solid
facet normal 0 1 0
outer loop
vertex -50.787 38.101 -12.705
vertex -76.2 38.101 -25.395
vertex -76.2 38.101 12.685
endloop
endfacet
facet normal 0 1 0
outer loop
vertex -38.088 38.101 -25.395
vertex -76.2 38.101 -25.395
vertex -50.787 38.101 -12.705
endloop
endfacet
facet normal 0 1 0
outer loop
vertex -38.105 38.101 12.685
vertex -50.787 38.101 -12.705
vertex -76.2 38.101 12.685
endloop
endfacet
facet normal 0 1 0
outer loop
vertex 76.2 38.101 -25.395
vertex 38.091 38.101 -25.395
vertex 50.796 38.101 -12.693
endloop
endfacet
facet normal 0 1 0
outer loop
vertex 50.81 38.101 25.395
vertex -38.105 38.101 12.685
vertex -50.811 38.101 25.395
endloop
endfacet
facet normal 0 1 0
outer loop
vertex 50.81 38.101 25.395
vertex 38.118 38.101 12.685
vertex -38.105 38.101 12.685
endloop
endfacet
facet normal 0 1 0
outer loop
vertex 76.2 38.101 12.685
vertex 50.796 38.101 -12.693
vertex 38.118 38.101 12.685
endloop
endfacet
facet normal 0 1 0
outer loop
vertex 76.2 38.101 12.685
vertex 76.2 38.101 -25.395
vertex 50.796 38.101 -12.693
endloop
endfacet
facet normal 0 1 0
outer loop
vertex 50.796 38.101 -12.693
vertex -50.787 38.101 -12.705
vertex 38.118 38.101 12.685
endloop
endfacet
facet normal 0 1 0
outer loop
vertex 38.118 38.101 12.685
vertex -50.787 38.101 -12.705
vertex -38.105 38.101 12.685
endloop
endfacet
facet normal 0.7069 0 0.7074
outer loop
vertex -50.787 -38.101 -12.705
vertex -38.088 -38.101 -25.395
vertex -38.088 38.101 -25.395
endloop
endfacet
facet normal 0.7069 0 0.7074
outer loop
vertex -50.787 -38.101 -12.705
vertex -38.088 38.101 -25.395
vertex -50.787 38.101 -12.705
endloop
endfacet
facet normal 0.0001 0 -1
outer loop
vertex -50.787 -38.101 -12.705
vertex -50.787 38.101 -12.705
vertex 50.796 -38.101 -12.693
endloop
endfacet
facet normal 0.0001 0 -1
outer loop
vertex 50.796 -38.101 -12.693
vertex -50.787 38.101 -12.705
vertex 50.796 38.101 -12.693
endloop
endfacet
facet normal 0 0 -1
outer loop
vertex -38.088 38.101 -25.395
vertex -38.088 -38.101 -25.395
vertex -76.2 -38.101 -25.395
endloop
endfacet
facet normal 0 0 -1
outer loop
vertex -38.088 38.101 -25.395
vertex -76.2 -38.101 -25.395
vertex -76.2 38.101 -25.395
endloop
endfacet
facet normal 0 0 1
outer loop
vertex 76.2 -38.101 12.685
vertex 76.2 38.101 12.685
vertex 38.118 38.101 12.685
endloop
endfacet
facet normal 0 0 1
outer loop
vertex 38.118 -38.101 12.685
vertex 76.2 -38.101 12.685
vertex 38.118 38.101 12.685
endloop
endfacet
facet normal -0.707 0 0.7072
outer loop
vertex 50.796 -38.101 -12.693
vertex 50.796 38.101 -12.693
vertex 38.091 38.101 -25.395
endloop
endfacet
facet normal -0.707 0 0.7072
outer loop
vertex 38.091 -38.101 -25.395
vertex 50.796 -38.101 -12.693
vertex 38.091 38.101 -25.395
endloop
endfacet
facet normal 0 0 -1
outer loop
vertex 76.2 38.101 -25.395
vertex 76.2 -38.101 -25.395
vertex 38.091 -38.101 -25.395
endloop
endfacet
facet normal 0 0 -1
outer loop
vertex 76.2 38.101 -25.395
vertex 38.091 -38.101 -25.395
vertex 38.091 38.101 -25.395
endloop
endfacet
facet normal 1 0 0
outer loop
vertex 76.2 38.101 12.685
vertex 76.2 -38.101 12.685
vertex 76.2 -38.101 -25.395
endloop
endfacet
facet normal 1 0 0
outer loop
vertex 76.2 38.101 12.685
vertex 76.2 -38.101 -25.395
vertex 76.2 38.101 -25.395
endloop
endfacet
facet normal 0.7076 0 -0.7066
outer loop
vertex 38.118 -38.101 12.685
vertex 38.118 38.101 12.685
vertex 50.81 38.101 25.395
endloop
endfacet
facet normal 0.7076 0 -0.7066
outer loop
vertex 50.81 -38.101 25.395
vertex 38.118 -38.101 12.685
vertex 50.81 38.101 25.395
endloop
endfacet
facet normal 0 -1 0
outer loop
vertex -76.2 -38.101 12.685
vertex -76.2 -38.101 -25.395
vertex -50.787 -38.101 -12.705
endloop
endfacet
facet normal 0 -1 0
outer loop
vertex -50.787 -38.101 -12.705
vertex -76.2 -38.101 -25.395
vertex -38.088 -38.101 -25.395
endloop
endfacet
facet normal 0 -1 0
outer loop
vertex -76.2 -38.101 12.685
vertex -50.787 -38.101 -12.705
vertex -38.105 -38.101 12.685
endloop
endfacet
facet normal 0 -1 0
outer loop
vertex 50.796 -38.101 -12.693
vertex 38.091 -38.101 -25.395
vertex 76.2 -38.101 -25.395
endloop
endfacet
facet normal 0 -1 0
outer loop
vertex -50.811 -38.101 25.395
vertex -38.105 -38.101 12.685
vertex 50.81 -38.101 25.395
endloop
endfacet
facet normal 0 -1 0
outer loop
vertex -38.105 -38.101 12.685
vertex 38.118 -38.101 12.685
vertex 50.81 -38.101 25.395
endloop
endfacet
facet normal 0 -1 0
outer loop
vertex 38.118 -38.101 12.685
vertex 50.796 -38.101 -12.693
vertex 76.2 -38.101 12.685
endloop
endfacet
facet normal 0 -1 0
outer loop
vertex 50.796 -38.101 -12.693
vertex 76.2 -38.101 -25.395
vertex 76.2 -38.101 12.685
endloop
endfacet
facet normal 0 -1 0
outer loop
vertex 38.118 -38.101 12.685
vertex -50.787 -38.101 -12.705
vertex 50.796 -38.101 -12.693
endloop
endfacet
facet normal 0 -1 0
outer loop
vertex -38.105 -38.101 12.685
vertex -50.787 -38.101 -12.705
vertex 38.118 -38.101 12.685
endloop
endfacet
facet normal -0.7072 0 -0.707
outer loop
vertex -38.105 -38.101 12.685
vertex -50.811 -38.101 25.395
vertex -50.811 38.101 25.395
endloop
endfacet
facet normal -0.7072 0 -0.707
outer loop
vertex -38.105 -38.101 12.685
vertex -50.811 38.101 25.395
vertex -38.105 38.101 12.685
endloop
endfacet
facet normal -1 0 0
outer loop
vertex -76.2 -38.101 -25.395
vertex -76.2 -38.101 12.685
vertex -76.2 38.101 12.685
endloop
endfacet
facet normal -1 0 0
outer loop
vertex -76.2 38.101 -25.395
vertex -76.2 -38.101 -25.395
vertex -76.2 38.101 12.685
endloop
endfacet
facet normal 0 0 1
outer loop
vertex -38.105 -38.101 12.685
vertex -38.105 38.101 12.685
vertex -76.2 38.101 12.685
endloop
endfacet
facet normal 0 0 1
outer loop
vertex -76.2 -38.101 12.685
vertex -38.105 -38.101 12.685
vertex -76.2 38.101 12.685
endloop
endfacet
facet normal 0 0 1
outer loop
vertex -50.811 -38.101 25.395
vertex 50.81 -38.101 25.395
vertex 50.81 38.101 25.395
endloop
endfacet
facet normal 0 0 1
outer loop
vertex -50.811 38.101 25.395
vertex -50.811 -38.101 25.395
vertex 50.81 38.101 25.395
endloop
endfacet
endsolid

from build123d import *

# Parameters (mm, degrees)
F0_W     = 76.2029737234
F0_H     = 50.7892221212
F1_DEPTH = 76.2
F2_DEPTH = 76.2
F3_W     = 25.3895288229
F3_H     = 12.7094006166
F4_DEPTH = 169.164


with BuildPart() as f1:
    # F0 (on Right) → F1 (new body)
    with BuildSketch(Plane.YZ):
        Rectangle(F0_W, F0_H)
    extrude(amount=F1_DEPTH)

    # F2 (add): a face of the model
    f2_faces = [f1.faces().sort_by_distance(p)[0] for p in [
        (0, 0, 0),
    ]]
    extrude(f2_faces, amount=F2_DEPTH)

    # F3 (on face) → F4 (cut)
    with BuildSketch(Plane(origin=(0, 38.1014868617, 0), x_dir=(-1, 0, 0), z_dir=(0, 1, 0))):
        Polygon((-50.7960021496, -12.6930763945), (-38.0911789834, -25.3946110606), (38.0879864097, -25.3946110606), (50.7873259485, -12.705120258), align=None)
        Polygon((76.2, 25.3946110606), (50.8108735085, 25.3946110606), (38.1050296128, 12.685210444), (50.8108735085, 12.685210444), (76.2, 12.685210444), align=None)
        Polygon((-50.8104711771, 25.3946110606), (-50.8104711771, 12.685210444), (-38.1180383265, 12.685210444), align=None)
        with Locations((-63.5052355886, 19.0399107523)):
            Rectangle(F3_W, F3_H)
    extrude(amount=-F4_DEPTH, mode=Mode.SUBTRACT)


solid = f1.part
